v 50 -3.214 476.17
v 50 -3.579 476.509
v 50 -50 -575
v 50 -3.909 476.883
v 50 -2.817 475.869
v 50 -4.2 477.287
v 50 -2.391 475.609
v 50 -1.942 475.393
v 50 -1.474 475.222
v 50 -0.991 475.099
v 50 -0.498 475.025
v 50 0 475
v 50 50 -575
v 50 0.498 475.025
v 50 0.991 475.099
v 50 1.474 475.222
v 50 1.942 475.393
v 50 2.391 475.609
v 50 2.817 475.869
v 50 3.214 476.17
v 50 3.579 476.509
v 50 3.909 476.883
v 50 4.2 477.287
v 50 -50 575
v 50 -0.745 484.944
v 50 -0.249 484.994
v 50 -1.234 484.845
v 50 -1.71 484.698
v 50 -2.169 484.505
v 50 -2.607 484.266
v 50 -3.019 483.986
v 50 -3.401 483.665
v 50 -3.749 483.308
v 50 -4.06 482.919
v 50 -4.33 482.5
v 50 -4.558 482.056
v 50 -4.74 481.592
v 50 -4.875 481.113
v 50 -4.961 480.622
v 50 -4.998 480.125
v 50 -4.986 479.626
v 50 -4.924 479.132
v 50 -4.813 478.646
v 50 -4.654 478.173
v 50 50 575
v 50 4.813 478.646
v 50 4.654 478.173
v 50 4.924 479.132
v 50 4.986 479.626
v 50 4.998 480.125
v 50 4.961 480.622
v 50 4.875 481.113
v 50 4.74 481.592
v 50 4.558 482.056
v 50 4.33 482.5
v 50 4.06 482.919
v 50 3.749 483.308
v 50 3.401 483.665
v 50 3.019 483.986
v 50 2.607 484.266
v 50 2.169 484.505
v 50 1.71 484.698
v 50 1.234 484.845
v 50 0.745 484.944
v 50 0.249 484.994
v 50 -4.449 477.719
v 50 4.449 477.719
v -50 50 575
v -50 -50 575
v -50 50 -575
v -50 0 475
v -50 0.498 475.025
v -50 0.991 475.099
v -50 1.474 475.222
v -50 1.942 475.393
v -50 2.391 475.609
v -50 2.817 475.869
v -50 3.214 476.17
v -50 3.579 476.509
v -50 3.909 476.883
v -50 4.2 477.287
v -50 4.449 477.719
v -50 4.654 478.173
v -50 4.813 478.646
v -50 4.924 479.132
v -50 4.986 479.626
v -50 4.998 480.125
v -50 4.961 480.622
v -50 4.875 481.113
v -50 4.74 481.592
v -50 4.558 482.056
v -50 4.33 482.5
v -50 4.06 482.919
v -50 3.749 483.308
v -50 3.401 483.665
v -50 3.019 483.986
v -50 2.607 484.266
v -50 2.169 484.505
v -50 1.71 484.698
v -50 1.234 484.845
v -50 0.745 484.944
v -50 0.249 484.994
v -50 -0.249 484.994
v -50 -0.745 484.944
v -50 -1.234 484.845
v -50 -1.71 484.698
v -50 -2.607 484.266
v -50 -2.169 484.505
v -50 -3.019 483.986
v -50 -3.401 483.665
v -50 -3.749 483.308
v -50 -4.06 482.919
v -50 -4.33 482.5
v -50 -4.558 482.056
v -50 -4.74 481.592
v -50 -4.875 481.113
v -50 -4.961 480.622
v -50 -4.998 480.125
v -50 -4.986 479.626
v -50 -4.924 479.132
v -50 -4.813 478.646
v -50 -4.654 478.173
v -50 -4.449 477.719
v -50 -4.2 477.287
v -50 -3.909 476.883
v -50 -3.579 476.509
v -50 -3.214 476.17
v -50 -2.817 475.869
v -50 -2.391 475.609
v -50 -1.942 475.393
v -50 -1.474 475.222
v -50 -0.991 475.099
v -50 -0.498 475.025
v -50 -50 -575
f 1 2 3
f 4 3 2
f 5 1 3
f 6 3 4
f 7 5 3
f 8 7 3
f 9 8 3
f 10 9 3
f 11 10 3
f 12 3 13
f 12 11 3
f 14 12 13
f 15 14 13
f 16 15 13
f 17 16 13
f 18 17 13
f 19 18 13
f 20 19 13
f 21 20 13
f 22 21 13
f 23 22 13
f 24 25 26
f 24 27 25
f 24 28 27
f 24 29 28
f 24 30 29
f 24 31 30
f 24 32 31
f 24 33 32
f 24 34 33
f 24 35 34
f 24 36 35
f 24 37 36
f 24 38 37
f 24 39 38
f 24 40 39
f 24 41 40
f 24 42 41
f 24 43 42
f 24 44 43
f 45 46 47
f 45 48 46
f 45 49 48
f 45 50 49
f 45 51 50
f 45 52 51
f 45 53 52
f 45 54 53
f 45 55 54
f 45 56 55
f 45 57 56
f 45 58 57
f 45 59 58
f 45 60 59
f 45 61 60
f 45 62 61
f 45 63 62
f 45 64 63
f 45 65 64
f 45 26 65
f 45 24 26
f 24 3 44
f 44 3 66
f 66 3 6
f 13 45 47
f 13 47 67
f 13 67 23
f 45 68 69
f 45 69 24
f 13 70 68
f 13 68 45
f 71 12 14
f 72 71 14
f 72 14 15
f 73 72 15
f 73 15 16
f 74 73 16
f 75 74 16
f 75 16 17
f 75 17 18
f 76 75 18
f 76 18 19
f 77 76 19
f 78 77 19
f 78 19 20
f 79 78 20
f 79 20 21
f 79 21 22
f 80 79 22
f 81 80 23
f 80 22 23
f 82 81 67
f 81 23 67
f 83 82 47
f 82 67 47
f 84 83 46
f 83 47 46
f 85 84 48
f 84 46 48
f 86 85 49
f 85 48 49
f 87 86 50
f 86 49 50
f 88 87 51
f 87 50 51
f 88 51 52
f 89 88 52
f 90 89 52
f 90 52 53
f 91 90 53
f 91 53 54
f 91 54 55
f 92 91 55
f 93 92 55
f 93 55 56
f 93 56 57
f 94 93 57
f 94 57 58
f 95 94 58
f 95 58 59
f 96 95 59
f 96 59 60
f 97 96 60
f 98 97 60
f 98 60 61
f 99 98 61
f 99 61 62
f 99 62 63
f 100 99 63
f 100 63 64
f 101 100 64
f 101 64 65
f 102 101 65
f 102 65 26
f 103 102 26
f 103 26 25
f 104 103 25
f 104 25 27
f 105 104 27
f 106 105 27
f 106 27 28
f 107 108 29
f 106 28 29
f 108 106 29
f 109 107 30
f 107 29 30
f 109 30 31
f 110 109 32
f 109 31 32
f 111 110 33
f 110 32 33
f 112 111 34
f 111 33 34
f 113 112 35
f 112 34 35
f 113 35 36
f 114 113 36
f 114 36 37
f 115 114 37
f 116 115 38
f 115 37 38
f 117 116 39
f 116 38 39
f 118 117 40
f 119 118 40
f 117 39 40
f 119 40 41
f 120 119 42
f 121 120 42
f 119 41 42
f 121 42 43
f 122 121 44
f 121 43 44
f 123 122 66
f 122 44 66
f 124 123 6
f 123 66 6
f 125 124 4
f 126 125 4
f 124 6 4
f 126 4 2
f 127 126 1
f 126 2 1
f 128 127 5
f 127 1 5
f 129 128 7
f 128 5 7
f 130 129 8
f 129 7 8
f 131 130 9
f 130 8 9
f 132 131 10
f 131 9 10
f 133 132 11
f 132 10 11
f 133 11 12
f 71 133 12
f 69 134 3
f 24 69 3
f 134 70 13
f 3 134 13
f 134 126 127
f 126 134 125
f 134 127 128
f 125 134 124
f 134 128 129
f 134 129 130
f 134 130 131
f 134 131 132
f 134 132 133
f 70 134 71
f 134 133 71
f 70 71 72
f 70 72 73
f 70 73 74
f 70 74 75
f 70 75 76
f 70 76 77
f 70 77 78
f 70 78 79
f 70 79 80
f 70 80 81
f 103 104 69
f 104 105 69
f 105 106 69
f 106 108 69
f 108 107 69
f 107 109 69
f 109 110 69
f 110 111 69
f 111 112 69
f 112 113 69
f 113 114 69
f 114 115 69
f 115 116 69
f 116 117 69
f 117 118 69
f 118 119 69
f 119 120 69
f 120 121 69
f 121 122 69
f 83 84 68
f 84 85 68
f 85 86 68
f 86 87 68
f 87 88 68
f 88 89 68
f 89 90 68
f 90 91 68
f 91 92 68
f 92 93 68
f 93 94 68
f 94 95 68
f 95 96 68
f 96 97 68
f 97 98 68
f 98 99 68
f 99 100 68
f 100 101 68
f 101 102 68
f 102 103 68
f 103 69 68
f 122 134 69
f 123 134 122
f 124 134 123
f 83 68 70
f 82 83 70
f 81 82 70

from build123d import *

# Parameters (mm, degrees)
SKETCH1_W           = 100
SKETCH1_H           = 100
BOSS_EXTRUDE1_DEPTH = 575
SKETCH2_R           = 5
CUT_EXTRUDE1_DEPTH  = 586.768725693


with BuildPart() as part:
    # Sketch1 → Boss-Extrude1 (new, symmetric)
    with BuildSketch(Plane.XY):
        Rectangle(SKETCH1_W, SKETCH1_H)
    extrude(amount=BOSS_EXTRUDE1_DEPTH, both=True)

    # Sketch2 → Cut-Extrude1 (cut, through all)
    with BuildSketch(Plane(origin=(50, 0, 0), x_dir=(0, 0, -1), z_dir=(1, 0, 0))):
        with Locations((-480, 0)):
            Circle(SKETCH2_R)
    extrude(amount=-CUT_EXTRUDE1_DEPTH, mode=Mode.SUBTRACT)


solid = part.part
